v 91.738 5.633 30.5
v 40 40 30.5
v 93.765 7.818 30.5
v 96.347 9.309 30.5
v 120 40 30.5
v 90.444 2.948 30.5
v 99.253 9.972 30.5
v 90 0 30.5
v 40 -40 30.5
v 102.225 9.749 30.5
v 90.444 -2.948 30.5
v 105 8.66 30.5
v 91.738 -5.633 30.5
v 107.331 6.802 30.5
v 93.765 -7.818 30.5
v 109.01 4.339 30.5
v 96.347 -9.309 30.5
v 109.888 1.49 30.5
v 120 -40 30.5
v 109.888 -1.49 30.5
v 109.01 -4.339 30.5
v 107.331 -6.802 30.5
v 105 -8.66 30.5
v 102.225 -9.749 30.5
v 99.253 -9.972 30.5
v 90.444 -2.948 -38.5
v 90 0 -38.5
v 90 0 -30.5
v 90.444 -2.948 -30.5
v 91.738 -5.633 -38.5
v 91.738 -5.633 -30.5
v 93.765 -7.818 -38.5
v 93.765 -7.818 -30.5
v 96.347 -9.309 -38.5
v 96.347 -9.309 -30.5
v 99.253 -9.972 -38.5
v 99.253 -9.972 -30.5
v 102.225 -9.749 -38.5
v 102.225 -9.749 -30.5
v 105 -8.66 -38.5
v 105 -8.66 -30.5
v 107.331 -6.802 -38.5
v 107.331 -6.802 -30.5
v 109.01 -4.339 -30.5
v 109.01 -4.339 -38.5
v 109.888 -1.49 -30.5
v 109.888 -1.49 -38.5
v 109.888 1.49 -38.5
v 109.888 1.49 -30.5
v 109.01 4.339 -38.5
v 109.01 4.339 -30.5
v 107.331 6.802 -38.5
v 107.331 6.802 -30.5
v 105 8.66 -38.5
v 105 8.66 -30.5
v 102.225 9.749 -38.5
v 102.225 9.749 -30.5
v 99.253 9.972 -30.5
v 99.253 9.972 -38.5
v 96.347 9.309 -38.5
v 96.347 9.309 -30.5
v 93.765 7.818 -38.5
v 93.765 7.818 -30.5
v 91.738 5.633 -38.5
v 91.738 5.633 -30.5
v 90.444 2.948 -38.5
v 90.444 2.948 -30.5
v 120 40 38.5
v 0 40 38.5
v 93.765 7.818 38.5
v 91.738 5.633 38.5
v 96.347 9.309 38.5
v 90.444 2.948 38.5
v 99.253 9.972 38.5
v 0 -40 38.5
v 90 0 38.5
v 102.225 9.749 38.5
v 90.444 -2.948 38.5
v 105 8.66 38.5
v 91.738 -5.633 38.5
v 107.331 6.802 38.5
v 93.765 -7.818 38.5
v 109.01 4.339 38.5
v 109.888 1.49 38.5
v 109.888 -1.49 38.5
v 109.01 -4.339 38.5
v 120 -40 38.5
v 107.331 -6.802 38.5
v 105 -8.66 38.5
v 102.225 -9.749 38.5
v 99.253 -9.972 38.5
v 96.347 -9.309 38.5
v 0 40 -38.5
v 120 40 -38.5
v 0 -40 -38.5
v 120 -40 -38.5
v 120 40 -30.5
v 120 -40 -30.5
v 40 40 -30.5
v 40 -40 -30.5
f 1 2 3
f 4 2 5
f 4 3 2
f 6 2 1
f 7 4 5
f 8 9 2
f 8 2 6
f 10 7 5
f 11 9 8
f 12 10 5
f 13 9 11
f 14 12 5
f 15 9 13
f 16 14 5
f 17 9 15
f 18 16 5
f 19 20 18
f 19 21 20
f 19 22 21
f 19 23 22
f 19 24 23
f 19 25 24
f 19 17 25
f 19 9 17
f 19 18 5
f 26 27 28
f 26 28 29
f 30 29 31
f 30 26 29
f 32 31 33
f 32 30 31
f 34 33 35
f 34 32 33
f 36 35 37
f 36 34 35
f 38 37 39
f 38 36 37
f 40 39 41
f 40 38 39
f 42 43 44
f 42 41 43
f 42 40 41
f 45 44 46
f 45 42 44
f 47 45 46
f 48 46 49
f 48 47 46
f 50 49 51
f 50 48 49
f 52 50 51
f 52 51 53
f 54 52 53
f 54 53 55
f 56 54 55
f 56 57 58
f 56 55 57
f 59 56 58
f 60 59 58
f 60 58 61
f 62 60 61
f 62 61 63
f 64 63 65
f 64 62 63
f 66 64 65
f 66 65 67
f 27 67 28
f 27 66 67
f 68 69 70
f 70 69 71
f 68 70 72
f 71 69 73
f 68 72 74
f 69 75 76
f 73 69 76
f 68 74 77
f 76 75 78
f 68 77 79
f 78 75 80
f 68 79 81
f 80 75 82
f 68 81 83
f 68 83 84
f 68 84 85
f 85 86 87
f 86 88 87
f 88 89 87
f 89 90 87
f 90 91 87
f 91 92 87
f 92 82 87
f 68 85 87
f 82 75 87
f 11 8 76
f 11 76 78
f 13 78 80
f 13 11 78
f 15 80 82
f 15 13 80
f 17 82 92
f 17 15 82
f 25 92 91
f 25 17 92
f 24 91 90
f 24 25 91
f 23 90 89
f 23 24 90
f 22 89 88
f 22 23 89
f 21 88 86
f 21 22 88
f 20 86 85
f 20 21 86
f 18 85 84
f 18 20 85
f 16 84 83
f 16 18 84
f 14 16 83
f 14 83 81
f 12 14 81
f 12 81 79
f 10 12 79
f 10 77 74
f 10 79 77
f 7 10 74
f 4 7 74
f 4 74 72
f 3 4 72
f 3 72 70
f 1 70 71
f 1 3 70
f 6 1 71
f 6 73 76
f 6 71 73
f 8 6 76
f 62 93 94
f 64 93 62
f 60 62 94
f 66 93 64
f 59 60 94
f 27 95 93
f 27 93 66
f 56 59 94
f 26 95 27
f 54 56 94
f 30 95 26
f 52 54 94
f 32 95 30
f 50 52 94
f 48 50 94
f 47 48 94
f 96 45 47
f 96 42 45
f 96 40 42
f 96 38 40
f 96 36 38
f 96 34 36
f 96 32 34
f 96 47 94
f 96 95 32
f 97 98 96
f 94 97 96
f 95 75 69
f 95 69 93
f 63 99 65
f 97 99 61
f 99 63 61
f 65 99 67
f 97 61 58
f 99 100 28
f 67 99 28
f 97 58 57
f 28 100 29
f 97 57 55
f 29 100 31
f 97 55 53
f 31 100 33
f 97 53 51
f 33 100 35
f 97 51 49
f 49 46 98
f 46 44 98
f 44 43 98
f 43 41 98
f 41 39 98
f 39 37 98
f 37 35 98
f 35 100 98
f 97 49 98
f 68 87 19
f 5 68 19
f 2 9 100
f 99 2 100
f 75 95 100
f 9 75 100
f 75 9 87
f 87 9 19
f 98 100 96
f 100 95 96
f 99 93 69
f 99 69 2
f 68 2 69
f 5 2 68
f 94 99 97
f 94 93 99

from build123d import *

# Parameters (mm, degrees)
BOSS_EXTRUDE1_DEPTH      = 40
BOSS_EXTRUDE1_DEPTH_BACK = 40
SKETCH1_W                = 120
SKETCH1_H                = 77
CUT_EXTRUDE1_DEPTH       = 100
CUT_EXTRUDE1_DEPTH_BACK  = 100
SKETCH2_W                = 80
SKETCH2_H                = 61
CUT_EXTRUDE2_DEPTH       = 100
CUT_EXTRUDE2_DEPTH_BACK  = 100
SKETCH3_R                = 10


with BuildPart() as part:
    # Sketch1 → Boss-Extrude1 (new, two sides: drawn at the far end of the back side and taken through both)
    with BuildSketch(Plane(origin=(0, 0, 0), x_dir=(1, 0, 0), z_dir=(0, 1, 0)).offset(-BOSS_EXTRUDE1_DEPTH_BACK)):
        with Locations((60, 0)):
            Rectangle(SKETCH1_W, SKETCH1_H)
    extrude(amount=BOSS_EXTRUDE1_DEPTH + BOSS_EXTRUDE1_DEPTH_BACK)

    # Sketch2 → Cut-Extrude1 (cut, two sides: drawn at the far end of the back side and taken through both)
    with BuildSketch(Plane(origin=(0, 0, 0), x_dir=(1, 0, 0), z_dir=(0, 1, 0)).offset(-CUT_EXTRUDE1_DEPTH_BACK)):
        with Locations((80, 0)):
            Rectangle(SKETCH2_W, SKETCH2_H)
    extrude(amount=CUT_EXTRUDE1_DEPTH + CUT_EXTRUDE1_DEPTH_BACK, mode=Mode.SUBTRACT)

    # Sketch3 → Cut-Extrude2 (cut, two sides: drawn at the far end of the back side and taken through both)
    with BuildSketch(Plane.XY.offset(-CUT_EXTRUDE2_DEPTH_BACK)):
        with Locations((100, 0)):
            Circle(SKETCH3_R)
    extrude(amount=CUT_EXTRUDE2_DEPTH + CUT_EXTRUDE2_DEPTH_BACK, mode=Mode.SUBTRACT)


solid = part.part
